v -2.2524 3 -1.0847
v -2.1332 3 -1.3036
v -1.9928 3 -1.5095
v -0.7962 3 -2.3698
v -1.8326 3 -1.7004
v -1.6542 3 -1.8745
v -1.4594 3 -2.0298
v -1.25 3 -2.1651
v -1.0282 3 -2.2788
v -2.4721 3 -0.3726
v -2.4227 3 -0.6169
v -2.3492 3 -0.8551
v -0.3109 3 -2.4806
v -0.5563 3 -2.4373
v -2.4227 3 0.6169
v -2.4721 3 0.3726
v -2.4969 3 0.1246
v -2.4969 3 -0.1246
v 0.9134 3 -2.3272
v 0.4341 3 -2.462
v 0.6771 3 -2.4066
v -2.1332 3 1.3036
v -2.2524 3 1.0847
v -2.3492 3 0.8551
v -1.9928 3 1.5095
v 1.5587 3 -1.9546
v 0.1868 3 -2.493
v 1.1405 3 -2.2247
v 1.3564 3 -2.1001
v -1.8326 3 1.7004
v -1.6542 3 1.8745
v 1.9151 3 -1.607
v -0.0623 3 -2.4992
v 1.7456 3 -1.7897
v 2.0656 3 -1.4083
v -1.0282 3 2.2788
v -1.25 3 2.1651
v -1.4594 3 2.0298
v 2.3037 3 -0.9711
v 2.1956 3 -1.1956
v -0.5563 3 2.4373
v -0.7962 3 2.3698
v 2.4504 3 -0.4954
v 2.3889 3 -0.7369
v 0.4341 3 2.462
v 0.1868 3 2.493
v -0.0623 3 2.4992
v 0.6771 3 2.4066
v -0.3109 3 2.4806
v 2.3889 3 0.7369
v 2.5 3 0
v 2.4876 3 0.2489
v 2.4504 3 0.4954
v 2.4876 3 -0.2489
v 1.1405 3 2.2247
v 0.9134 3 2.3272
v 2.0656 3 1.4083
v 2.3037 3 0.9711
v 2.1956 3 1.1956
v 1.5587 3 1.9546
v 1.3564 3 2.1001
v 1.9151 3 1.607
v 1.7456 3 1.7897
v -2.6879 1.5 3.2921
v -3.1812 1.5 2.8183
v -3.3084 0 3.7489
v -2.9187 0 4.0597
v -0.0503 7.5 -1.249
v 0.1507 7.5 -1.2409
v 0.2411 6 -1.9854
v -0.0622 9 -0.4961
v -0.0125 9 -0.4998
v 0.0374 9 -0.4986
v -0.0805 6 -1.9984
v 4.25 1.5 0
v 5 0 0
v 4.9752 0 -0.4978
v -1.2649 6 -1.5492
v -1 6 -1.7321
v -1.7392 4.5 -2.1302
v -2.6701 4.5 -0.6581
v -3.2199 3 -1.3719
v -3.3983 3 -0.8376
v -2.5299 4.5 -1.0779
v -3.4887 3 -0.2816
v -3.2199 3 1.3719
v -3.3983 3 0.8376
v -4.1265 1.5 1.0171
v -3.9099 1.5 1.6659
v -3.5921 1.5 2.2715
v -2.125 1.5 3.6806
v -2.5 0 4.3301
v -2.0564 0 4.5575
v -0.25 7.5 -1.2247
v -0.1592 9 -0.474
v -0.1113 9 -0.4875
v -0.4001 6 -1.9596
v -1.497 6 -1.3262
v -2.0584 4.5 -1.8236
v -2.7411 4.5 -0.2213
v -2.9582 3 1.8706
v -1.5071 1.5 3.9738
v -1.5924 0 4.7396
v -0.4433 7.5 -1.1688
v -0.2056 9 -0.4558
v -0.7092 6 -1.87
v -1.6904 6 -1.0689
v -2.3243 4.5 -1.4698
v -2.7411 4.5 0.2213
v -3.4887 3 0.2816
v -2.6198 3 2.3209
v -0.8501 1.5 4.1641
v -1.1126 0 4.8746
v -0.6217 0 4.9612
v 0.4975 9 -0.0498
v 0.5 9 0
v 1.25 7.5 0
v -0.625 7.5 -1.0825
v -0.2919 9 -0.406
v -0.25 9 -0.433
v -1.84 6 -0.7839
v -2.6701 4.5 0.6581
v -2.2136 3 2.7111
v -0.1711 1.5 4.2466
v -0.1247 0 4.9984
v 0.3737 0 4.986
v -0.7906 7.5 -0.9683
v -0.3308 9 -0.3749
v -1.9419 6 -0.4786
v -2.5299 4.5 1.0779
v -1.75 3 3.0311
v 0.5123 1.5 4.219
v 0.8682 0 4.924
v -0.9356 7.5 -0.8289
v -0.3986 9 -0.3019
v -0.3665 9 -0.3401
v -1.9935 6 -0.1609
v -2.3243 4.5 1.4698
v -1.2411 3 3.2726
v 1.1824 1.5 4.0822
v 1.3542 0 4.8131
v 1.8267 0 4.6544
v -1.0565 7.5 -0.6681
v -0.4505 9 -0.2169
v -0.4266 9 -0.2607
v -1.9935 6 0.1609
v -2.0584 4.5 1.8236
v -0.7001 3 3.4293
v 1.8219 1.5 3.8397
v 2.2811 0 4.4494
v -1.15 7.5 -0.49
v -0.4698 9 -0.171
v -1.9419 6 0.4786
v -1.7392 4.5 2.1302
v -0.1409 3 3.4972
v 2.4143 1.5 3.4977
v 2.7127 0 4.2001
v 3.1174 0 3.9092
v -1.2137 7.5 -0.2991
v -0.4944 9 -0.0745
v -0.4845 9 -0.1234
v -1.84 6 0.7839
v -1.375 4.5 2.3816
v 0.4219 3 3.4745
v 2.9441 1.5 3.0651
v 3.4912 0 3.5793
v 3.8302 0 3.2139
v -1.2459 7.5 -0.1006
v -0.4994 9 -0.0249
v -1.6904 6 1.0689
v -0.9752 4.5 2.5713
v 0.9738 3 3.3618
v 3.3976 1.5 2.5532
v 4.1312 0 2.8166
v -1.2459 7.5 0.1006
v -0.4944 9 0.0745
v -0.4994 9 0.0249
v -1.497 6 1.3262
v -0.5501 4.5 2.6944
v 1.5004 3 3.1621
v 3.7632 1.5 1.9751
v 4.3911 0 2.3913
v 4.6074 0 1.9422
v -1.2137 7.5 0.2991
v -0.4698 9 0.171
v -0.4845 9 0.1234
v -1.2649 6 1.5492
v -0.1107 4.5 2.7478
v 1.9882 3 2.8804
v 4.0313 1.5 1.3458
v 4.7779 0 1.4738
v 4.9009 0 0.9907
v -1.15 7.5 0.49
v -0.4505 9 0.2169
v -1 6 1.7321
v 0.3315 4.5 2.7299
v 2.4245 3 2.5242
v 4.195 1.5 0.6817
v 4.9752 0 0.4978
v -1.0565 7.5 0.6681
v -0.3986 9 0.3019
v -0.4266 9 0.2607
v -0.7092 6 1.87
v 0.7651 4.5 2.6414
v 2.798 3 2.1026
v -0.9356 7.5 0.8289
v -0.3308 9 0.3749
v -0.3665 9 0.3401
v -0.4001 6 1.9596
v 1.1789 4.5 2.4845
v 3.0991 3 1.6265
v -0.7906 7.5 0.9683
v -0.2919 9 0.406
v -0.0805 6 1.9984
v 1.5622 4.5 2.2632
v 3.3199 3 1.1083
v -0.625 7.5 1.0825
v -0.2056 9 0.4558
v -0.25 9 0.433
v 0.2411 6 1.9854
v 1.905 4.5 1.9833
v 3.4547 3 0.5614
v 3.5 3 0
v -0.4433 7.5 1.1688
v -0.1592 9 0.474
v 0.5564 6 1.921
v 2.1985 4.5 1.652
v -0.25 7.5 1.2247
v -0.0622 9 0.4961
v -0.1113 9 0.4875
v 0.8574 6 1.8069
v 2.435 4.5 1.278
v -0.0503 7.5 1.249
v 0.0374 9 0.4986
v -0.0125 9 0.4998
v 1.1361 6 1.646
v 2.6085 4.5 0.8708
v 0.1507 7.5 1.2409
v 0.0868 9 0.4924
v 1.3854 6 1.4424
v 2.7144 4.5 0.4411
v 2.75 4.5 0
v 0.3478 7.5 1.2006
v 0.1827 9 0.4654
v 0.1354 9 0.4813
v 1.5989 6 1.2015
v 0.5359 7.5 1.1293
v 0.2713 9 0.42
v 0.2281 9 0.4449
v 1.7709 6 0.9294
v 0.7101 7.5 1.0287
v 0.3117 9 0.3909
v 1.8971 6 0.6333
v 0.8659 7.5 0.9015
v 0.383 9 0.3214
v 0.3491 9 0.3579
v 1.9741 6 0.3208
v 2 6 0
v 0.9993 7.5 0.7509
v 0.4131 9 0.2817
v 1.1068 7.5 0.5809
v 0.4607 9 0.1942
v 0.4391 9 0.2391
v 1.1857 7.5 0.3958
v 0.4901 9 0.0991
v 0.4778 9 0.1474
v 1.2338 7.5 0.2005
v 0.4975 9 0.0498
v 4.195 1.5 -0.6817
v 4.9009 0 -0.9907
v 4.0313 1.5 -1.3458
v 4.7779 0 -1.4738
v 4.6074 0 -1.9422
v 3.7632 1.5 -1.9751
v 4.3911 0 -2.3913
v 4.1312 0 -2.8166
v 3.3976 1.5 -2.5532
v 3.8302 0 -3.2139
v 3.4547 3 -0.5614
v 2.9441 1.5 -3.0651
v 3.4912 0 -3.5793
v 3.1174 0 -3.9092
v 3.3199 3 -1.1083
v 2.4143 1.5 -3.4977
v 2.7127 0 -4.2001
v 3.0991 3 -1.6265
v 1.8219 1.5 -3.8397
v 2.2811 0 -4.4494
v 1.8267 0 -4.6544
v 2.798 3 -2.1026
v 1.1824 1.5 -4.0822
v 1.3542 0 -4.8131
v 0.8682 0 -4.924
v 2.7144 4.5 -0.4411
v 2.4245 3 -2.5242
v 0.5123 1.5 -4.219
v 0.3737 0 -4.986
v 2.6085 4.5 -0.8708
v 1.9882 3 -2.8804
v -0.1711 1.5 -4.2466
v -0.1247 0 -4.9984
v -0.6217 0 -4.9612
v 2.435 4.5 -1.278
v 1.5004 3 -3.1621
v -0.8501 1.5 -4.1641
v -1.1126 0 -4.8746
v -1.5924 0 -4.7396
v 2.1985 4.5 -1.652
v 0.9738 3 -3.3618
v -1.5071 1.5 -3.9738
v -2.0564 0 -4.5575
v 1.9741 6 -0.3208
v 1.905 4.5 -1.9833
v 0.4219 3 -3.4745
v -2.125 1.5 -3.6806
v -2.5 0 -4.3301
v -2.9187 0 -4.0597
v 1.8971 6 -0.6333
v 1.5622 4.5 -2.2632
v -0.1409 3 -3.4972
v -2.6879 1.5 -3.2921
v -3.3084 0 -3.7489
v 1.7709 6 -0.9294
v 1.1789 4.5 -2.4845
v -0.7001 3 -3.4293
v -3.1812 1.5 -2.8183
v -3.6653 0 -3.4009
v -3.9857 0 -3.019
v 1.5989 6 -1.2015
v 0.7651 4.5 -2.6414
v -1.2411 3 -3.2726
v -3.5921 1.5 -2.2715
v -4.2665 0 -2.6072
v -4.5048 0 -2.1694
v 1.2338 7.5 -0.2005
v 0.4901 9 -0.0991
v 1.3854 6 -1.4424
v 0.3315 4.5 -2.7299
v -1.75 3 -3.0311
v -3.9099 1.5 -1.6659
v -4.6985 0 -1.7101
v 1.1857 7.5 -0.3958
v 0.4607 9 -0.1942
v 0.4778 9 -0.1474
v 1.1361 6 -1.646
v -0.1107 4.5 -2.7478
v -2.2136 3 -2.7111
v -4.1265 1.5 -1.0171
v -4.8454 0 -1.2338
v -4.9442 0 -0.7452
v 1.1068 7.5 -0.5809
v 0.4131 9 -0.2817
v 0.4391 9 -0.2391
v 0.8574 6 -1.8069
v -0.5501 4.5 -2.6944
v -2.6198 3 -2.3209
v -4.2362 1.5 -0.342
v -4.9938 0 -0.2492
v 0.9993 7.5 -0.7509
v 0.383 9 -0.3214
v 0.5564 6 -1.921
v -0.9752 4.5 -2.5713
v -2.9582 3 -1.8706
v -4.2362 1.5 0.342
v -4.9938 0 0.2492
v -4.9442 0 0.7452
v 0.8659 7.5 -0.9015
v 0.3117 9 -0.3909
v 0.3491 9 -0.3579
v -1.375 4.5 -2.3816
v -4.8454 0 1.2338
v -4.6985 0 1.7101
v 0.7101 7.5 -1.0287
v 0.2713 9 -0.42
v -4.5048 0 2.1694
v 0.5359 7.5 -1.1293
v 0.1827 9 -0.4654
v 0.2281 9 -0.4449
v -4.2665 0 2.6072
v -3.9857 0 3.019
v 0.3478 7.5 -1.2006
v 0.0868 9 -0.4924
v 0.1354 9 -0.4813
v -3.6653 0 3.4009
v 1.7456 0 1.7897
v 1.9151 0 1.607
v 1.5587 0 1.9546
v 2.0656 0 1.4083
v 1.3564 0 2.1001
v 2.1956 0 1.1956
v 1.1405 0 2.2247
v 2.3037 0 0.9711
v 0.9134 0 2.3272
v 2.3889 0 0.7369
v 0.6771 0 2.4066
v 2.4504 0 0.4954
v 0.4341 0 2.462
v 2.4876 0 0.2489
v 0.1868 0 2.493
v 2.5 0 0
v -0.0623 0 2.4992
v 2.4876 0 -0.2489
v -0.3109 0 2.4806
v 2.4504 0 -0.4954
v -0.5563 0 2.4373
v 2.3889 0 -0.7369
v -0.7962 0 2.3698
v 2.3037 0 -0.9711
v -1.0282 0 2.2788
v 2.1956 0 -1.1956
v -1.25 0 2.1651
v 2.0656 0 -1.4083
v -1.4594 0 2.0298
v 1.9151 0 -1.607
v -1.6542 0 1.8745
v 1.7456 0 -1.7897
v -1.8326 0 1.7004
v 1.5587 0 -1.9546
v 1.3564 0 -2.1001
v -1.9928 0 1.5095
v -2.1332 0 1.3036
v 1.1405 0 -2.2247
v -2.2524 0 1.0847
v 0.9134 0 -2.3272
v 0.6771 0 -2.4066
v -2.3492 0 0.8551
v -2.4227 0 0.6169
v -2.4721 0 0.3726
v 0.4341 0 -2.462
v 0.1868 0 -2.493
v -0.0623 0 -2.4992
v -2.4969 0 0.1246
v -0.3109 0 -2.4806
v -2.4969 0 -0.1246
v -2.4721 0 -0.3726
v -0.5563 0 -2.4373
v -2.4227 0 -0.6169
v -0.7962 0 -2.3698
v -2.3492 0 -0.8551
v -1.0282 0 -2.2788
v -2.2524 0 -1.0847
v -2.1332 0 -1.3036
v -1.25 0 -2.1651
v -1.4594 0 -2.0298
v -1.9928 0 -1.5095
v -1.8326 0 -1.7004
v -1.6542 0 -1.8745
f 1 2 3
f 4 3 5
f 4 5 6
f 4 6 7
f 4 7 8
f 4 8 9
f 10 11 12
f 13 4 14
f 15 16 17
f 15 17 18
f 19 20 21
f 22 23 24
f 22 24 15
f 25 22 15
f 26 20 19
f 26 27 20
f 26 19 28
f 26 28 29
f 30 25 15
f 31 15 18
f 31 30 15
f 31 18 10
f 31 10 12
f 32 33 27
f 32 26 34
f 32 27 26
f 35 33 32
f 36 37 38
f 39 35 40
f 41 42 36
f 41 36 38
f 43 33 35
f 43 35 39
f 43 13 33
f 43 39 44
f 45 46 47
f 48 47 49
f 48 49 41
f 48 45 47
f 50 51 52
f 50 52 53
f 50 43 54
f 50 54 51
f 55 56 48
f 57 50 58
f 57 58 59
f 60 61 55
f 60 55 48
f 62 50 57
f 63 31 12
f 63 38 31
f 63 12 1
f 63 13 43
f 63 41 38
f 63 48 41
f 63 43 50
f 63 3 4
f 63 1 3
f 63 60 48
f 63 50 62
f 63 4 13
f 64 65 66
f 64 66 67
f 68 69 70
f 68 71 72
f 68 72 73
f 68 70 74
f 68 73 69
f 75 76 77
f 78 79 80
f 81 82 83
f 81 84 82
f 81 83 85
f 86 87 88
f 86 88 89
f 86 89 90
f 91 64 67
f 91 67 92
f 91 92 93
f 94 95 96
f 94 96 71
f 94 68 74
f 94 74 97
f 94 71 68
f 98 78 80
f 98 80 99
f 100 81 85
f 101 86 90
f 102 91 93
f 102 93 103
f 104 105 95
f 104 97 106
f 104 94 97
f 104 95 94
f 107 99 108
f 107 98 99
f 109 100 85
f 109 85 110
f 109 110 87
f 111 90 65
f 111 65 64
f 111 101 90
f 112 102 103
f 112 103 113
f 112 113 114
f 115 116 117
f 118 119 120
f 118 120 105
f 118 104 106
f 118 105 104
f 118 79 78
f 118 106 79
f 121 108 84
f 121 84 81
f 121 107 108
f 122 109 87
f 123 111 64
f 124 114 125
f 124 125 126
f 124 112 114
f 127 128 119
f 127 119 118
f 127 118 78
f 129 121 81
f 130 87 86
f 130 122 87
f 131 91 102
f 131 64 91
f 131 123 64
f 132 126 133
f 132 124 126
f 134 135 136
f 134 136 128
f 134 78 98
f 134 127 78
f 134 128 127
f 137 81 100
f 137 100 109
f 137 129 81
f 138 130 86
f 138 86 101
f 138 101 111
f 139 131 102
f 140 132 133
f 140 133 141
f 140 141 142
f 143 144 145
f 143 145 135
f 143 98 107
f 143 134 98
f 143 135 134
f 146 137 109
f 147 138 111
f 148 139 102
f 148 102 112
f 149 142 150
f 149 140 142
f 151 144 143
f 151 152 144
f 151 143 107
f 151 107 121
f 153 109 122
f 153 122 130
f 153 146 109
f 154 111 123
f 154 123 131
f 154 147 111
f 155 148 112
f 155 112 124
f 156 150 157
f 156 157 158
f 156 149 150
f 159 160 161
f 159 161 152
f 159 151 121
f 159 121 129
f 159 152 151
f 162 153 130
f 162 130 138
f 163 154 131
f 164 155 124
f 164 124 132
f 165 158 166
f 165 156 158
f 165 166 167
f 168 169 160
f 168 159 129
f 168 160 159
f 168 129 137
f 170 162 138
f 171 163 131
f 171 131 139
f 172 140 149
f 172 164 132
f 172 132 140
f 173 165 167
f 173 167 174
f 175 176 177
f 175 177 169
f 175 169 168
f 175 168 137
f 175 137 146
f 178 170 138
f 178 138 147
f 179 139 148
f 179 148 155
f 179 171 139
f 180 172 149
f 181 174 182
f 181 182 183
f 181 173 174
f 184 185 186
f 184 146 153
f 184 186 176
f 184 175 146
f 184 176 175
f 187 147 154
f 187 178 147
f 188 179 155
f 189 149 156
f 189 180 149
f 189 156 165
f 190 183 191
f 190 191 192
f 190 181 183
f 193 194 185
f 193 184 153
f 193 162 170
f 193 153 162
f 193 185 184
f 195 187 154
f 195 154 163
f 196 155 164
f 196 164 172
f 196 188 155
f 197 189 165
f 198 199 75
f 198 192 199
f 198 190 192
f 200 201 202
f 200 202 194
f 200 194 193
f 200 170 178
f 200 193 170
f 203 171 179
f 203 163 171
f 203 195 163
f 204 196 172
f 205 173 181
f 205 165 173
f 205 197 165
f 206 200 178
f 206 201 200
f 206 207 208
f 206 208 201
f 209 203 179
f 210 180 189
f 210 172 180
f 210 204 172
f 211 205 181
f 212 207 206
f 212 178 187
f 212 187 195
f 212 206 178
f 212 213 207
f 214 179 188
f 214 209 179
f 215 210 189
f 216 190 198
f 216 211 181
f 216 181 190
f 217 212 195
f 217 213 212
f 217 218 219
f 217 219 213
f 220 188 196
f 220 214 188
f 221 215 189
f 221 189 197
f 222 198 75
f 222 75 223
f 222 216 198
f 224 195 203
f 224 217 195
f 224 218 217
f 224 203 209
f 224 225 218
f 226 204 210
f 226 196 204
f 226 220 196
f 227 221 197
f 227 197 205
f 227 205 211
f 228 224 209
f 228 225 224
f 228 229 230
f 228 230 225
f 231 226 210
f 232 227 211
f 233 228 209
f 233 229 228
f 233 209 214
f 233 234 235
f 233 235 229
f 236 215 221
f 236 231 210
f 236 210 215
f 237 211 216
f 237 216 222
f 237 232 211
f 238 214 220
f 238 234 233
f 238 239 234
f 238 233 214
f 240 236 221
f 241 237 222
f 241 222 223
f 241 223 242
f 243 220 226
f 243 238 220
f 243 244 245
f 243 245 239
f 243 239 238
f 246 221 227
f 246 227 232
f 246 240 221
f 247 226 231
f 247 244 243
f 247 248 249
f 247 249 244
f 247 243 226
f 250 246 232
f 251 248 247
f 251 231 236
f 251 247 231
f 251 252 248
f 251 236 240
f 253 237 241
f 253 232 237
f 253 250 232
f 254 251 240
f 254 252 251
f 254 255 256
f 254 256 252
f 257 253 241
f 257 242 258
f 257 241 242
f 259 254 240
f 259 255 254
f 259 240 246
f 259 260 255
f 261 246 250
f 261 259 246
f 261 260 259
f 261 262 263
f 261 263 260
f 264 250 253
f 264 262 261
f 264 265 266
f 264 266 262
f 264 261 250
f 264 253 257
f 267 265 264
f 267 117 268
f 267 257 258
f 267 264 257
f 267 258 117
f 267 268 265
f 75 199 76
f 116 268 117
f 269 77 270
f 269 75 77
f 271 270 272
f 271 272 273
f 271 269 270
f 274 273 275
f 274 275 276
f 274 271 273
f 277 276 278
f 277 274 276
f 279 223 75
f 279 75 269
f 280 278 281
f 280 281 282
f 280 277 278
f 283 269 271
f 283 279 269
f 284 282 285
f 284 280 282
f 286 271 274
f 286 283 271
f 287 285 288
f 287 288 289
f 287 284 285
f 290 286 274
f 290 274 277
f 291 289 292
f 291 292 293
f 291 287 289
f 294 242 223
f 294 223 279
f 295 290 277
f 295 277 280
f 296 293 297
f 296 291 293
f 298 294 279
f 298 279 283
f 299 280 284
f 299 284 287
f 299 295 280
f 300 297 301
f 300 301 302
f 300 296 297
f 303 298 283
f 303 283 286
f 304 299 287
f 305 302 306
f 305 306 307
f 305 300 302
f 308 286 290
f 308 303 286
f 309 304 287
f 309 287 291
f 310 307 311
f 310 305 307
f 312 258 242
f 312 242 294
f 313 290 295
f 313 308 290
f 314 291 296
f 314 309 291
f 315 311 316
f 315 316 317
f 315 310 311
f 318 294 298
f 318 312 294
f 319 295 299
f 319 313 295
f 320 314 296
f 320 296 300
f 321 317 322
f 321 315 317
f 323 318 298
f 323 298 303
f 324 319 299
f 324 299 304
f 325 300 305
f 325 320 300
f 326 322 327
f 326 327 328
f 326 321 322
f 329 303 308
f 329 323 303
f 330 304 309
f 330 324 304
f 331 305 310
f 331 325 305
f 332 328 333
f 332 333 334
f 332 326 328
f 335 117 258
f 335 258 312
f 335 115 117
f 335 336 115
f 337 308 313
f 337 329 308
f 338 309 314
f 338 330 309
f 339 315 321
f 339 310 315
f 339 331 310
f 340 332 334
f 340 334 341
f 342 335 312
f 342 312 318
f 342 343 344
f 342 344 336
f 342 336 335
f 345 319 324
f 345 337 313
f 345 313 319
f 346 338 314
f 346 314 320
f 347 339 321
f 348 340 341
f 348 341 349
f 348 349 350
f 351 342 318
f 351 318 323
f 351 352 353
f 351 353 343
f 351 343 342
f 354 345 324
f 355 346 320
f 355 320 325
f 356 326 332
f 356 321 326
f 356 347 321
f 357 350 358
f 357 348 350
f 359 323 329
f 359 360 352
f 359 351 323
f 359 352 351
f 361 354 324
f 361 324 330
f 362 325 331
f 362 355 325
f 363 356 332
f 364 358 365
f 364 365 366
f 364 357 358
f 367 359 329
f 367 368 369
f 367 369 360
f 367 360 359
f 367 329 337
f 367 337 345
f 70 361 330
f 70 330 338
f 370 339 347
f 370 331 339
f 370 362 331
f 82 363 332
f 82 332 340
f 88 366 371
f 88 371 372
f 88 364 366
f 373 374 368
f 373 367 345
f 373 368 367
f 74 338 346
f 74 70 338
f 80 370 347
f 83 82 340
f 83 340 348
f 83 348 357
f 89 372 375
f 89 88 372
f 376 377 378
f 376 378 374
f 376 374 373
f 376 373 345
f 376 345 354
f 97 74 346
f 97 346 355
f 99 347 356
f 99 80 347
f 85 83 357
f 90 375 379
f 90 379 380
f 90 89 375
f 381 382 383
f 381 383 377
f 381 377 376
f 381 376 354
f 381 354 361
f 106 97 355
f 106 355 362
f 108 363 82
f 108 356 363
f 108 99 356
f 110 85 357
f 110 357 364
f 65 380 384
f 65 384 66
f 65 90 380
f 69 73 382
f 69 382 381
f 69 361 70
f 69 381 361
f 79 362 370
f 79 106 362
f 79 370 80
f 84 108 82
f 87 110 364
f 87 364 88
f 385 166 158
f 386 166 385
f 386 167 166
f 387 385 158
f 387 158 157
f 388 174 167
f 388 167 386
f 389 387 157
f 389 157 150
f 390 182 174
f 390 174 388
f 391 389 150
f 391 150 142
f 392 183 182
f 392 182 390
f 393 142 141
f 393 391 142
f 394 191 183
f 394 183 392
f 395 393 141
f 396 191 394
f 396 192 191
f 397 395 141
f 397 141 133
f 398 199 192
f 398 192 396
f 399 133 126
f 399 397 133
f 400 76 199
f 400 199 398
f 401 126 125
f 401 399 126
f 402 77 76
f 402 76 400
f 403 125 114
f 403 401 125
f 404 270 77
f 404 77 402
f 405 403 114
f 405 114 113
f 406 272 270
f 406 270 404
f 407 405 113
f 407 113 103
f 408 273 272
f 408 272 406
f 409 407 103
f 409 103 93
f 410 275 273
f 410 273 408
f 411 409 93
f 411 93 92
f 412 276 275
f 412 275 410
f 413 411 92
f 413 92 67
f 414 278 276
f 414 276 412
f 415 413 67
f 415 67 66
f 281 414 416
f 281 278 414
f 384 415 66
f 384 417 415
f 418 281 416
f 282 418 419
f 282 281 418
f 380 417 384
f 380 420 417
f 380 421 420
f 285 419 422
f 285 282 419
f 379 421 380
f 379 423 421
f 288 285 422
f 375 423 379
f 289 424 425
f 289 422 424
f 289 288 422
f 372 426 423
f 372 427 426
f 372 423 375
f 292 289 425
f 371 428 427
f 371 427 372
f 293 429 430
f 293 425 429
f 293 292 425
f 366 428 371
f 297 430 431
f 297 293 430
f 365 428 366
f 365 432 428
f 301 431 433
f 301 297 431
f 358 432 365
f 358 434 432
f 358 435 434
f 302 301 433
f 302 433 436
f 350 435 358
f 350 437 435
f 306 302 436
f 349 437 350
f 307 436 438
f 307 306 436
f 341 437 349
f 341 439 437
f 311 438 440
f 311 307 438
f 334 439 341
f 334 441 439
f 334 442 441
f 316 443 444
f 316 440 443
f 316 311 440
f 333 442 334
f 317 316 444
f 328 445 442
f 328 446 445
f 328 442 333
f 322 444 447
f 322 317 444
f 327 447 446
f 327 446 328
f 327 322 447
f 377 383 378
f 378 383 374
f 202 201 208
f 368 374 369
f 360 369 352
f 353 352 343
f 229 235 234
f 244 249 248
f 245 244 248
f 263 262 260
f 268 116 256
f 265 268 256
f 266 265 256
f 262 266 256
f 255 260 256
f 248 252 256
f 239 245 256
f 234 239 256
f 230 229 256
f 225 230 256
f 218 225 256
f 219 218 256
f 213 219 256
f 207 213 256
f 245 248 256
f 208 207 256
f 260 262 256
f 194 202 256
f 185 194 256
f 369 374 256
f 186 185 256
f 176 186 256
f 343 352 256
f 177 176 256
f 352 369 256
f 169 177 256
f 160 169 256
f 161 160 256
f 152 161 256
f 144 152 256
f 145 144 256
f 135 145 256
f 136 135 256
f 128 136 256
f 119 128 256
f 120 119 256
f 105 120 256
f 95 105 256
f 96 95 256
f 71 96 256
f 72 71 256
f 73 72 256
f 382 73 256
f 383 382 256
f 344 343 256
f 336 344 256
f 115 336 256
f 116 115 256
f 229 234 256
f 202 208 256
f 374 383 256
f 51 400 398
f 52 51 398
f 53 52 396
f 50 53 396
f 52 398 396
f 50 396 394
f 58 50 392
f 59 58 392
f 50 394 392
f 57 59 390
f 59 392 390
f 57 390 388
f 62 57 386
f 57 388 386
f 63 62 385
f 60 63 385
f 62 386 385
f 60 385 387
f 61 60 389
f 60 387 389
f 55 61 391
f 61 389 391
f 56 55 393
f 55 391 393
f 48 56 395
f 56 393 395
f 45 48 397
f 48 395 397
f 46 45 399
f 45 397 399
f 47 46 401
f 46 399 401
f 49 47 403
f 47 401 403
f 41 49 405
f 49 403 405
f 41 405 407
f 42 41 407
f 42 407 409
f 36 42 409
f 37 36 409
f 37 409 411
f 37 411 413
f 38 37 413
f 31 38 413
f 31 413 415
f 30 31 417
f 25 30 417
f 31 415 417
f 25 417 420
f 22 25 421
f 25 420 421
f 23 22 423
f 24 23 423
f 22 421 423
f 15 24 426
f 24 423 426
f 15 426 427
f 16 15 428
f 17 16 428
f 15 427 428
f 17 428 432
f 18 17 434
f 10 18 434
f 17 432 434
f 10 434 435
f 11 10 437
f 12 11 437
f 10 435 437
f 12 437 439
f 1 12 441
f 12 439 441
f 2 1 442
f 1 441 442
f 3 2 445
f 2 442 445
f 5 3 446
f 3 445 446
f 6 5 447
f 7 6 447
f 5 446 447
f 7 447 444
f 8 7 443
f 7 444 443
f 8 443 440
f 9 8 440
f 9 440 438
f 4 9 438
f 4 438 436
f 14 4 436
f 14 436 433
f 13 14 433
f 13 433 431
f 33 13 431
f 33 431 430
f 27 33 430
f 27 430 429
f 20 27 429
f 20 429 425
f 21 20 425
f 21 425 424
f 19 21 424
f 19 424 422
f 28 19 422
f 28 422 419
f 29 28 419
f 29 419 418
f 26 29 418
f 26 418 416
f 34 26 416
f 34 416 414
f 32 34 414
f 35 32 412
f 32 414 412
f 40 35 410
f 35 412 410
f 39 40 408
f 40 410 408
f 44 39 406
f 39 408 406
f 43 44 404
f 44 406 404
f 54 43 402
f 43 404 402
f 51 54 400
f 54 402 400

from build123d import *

# Parameters (mm, degrees)
CUT_EXTRUDE_START   = -9
SKETCH_2_R          = 0.5
CUT_EXTRUDE_1_DEPTH = 10
SKETCH_3_R          = 2.5
CUT_EXTRUDE_2_DEPTH = 3


with BuildPart() as part:
    # 草图1 → 旋转1 (revolve)
    with BuildSketch(Plane.XY):
        Polygon((0, 0), (5, 0), (0, 10), align=None)
    revolve(axis=Axis((0, 0, 0), (0, 1, 0)))

    # 草图2 → 切除-拉伸1 (cut)
    with BuildSketch(Plane.XZ.offset(CUT_EXTRUDE_START)):
        Circle(SKETCH_2_R)
    extrude(amount=-CUT_EXTRUDE_1_DEPTH, mode=Mode.SUBTRACT)

    # 草图3 → 切除-拉伸2 (cut)
    with BuildSketch(Plane.XZ):
        Circle(SKETCH_3_R)
    extrude(amount=-CUT_EXTRUDE_2_DEPTH, mode=Mode.SUBTRACT)


solid = part.part
